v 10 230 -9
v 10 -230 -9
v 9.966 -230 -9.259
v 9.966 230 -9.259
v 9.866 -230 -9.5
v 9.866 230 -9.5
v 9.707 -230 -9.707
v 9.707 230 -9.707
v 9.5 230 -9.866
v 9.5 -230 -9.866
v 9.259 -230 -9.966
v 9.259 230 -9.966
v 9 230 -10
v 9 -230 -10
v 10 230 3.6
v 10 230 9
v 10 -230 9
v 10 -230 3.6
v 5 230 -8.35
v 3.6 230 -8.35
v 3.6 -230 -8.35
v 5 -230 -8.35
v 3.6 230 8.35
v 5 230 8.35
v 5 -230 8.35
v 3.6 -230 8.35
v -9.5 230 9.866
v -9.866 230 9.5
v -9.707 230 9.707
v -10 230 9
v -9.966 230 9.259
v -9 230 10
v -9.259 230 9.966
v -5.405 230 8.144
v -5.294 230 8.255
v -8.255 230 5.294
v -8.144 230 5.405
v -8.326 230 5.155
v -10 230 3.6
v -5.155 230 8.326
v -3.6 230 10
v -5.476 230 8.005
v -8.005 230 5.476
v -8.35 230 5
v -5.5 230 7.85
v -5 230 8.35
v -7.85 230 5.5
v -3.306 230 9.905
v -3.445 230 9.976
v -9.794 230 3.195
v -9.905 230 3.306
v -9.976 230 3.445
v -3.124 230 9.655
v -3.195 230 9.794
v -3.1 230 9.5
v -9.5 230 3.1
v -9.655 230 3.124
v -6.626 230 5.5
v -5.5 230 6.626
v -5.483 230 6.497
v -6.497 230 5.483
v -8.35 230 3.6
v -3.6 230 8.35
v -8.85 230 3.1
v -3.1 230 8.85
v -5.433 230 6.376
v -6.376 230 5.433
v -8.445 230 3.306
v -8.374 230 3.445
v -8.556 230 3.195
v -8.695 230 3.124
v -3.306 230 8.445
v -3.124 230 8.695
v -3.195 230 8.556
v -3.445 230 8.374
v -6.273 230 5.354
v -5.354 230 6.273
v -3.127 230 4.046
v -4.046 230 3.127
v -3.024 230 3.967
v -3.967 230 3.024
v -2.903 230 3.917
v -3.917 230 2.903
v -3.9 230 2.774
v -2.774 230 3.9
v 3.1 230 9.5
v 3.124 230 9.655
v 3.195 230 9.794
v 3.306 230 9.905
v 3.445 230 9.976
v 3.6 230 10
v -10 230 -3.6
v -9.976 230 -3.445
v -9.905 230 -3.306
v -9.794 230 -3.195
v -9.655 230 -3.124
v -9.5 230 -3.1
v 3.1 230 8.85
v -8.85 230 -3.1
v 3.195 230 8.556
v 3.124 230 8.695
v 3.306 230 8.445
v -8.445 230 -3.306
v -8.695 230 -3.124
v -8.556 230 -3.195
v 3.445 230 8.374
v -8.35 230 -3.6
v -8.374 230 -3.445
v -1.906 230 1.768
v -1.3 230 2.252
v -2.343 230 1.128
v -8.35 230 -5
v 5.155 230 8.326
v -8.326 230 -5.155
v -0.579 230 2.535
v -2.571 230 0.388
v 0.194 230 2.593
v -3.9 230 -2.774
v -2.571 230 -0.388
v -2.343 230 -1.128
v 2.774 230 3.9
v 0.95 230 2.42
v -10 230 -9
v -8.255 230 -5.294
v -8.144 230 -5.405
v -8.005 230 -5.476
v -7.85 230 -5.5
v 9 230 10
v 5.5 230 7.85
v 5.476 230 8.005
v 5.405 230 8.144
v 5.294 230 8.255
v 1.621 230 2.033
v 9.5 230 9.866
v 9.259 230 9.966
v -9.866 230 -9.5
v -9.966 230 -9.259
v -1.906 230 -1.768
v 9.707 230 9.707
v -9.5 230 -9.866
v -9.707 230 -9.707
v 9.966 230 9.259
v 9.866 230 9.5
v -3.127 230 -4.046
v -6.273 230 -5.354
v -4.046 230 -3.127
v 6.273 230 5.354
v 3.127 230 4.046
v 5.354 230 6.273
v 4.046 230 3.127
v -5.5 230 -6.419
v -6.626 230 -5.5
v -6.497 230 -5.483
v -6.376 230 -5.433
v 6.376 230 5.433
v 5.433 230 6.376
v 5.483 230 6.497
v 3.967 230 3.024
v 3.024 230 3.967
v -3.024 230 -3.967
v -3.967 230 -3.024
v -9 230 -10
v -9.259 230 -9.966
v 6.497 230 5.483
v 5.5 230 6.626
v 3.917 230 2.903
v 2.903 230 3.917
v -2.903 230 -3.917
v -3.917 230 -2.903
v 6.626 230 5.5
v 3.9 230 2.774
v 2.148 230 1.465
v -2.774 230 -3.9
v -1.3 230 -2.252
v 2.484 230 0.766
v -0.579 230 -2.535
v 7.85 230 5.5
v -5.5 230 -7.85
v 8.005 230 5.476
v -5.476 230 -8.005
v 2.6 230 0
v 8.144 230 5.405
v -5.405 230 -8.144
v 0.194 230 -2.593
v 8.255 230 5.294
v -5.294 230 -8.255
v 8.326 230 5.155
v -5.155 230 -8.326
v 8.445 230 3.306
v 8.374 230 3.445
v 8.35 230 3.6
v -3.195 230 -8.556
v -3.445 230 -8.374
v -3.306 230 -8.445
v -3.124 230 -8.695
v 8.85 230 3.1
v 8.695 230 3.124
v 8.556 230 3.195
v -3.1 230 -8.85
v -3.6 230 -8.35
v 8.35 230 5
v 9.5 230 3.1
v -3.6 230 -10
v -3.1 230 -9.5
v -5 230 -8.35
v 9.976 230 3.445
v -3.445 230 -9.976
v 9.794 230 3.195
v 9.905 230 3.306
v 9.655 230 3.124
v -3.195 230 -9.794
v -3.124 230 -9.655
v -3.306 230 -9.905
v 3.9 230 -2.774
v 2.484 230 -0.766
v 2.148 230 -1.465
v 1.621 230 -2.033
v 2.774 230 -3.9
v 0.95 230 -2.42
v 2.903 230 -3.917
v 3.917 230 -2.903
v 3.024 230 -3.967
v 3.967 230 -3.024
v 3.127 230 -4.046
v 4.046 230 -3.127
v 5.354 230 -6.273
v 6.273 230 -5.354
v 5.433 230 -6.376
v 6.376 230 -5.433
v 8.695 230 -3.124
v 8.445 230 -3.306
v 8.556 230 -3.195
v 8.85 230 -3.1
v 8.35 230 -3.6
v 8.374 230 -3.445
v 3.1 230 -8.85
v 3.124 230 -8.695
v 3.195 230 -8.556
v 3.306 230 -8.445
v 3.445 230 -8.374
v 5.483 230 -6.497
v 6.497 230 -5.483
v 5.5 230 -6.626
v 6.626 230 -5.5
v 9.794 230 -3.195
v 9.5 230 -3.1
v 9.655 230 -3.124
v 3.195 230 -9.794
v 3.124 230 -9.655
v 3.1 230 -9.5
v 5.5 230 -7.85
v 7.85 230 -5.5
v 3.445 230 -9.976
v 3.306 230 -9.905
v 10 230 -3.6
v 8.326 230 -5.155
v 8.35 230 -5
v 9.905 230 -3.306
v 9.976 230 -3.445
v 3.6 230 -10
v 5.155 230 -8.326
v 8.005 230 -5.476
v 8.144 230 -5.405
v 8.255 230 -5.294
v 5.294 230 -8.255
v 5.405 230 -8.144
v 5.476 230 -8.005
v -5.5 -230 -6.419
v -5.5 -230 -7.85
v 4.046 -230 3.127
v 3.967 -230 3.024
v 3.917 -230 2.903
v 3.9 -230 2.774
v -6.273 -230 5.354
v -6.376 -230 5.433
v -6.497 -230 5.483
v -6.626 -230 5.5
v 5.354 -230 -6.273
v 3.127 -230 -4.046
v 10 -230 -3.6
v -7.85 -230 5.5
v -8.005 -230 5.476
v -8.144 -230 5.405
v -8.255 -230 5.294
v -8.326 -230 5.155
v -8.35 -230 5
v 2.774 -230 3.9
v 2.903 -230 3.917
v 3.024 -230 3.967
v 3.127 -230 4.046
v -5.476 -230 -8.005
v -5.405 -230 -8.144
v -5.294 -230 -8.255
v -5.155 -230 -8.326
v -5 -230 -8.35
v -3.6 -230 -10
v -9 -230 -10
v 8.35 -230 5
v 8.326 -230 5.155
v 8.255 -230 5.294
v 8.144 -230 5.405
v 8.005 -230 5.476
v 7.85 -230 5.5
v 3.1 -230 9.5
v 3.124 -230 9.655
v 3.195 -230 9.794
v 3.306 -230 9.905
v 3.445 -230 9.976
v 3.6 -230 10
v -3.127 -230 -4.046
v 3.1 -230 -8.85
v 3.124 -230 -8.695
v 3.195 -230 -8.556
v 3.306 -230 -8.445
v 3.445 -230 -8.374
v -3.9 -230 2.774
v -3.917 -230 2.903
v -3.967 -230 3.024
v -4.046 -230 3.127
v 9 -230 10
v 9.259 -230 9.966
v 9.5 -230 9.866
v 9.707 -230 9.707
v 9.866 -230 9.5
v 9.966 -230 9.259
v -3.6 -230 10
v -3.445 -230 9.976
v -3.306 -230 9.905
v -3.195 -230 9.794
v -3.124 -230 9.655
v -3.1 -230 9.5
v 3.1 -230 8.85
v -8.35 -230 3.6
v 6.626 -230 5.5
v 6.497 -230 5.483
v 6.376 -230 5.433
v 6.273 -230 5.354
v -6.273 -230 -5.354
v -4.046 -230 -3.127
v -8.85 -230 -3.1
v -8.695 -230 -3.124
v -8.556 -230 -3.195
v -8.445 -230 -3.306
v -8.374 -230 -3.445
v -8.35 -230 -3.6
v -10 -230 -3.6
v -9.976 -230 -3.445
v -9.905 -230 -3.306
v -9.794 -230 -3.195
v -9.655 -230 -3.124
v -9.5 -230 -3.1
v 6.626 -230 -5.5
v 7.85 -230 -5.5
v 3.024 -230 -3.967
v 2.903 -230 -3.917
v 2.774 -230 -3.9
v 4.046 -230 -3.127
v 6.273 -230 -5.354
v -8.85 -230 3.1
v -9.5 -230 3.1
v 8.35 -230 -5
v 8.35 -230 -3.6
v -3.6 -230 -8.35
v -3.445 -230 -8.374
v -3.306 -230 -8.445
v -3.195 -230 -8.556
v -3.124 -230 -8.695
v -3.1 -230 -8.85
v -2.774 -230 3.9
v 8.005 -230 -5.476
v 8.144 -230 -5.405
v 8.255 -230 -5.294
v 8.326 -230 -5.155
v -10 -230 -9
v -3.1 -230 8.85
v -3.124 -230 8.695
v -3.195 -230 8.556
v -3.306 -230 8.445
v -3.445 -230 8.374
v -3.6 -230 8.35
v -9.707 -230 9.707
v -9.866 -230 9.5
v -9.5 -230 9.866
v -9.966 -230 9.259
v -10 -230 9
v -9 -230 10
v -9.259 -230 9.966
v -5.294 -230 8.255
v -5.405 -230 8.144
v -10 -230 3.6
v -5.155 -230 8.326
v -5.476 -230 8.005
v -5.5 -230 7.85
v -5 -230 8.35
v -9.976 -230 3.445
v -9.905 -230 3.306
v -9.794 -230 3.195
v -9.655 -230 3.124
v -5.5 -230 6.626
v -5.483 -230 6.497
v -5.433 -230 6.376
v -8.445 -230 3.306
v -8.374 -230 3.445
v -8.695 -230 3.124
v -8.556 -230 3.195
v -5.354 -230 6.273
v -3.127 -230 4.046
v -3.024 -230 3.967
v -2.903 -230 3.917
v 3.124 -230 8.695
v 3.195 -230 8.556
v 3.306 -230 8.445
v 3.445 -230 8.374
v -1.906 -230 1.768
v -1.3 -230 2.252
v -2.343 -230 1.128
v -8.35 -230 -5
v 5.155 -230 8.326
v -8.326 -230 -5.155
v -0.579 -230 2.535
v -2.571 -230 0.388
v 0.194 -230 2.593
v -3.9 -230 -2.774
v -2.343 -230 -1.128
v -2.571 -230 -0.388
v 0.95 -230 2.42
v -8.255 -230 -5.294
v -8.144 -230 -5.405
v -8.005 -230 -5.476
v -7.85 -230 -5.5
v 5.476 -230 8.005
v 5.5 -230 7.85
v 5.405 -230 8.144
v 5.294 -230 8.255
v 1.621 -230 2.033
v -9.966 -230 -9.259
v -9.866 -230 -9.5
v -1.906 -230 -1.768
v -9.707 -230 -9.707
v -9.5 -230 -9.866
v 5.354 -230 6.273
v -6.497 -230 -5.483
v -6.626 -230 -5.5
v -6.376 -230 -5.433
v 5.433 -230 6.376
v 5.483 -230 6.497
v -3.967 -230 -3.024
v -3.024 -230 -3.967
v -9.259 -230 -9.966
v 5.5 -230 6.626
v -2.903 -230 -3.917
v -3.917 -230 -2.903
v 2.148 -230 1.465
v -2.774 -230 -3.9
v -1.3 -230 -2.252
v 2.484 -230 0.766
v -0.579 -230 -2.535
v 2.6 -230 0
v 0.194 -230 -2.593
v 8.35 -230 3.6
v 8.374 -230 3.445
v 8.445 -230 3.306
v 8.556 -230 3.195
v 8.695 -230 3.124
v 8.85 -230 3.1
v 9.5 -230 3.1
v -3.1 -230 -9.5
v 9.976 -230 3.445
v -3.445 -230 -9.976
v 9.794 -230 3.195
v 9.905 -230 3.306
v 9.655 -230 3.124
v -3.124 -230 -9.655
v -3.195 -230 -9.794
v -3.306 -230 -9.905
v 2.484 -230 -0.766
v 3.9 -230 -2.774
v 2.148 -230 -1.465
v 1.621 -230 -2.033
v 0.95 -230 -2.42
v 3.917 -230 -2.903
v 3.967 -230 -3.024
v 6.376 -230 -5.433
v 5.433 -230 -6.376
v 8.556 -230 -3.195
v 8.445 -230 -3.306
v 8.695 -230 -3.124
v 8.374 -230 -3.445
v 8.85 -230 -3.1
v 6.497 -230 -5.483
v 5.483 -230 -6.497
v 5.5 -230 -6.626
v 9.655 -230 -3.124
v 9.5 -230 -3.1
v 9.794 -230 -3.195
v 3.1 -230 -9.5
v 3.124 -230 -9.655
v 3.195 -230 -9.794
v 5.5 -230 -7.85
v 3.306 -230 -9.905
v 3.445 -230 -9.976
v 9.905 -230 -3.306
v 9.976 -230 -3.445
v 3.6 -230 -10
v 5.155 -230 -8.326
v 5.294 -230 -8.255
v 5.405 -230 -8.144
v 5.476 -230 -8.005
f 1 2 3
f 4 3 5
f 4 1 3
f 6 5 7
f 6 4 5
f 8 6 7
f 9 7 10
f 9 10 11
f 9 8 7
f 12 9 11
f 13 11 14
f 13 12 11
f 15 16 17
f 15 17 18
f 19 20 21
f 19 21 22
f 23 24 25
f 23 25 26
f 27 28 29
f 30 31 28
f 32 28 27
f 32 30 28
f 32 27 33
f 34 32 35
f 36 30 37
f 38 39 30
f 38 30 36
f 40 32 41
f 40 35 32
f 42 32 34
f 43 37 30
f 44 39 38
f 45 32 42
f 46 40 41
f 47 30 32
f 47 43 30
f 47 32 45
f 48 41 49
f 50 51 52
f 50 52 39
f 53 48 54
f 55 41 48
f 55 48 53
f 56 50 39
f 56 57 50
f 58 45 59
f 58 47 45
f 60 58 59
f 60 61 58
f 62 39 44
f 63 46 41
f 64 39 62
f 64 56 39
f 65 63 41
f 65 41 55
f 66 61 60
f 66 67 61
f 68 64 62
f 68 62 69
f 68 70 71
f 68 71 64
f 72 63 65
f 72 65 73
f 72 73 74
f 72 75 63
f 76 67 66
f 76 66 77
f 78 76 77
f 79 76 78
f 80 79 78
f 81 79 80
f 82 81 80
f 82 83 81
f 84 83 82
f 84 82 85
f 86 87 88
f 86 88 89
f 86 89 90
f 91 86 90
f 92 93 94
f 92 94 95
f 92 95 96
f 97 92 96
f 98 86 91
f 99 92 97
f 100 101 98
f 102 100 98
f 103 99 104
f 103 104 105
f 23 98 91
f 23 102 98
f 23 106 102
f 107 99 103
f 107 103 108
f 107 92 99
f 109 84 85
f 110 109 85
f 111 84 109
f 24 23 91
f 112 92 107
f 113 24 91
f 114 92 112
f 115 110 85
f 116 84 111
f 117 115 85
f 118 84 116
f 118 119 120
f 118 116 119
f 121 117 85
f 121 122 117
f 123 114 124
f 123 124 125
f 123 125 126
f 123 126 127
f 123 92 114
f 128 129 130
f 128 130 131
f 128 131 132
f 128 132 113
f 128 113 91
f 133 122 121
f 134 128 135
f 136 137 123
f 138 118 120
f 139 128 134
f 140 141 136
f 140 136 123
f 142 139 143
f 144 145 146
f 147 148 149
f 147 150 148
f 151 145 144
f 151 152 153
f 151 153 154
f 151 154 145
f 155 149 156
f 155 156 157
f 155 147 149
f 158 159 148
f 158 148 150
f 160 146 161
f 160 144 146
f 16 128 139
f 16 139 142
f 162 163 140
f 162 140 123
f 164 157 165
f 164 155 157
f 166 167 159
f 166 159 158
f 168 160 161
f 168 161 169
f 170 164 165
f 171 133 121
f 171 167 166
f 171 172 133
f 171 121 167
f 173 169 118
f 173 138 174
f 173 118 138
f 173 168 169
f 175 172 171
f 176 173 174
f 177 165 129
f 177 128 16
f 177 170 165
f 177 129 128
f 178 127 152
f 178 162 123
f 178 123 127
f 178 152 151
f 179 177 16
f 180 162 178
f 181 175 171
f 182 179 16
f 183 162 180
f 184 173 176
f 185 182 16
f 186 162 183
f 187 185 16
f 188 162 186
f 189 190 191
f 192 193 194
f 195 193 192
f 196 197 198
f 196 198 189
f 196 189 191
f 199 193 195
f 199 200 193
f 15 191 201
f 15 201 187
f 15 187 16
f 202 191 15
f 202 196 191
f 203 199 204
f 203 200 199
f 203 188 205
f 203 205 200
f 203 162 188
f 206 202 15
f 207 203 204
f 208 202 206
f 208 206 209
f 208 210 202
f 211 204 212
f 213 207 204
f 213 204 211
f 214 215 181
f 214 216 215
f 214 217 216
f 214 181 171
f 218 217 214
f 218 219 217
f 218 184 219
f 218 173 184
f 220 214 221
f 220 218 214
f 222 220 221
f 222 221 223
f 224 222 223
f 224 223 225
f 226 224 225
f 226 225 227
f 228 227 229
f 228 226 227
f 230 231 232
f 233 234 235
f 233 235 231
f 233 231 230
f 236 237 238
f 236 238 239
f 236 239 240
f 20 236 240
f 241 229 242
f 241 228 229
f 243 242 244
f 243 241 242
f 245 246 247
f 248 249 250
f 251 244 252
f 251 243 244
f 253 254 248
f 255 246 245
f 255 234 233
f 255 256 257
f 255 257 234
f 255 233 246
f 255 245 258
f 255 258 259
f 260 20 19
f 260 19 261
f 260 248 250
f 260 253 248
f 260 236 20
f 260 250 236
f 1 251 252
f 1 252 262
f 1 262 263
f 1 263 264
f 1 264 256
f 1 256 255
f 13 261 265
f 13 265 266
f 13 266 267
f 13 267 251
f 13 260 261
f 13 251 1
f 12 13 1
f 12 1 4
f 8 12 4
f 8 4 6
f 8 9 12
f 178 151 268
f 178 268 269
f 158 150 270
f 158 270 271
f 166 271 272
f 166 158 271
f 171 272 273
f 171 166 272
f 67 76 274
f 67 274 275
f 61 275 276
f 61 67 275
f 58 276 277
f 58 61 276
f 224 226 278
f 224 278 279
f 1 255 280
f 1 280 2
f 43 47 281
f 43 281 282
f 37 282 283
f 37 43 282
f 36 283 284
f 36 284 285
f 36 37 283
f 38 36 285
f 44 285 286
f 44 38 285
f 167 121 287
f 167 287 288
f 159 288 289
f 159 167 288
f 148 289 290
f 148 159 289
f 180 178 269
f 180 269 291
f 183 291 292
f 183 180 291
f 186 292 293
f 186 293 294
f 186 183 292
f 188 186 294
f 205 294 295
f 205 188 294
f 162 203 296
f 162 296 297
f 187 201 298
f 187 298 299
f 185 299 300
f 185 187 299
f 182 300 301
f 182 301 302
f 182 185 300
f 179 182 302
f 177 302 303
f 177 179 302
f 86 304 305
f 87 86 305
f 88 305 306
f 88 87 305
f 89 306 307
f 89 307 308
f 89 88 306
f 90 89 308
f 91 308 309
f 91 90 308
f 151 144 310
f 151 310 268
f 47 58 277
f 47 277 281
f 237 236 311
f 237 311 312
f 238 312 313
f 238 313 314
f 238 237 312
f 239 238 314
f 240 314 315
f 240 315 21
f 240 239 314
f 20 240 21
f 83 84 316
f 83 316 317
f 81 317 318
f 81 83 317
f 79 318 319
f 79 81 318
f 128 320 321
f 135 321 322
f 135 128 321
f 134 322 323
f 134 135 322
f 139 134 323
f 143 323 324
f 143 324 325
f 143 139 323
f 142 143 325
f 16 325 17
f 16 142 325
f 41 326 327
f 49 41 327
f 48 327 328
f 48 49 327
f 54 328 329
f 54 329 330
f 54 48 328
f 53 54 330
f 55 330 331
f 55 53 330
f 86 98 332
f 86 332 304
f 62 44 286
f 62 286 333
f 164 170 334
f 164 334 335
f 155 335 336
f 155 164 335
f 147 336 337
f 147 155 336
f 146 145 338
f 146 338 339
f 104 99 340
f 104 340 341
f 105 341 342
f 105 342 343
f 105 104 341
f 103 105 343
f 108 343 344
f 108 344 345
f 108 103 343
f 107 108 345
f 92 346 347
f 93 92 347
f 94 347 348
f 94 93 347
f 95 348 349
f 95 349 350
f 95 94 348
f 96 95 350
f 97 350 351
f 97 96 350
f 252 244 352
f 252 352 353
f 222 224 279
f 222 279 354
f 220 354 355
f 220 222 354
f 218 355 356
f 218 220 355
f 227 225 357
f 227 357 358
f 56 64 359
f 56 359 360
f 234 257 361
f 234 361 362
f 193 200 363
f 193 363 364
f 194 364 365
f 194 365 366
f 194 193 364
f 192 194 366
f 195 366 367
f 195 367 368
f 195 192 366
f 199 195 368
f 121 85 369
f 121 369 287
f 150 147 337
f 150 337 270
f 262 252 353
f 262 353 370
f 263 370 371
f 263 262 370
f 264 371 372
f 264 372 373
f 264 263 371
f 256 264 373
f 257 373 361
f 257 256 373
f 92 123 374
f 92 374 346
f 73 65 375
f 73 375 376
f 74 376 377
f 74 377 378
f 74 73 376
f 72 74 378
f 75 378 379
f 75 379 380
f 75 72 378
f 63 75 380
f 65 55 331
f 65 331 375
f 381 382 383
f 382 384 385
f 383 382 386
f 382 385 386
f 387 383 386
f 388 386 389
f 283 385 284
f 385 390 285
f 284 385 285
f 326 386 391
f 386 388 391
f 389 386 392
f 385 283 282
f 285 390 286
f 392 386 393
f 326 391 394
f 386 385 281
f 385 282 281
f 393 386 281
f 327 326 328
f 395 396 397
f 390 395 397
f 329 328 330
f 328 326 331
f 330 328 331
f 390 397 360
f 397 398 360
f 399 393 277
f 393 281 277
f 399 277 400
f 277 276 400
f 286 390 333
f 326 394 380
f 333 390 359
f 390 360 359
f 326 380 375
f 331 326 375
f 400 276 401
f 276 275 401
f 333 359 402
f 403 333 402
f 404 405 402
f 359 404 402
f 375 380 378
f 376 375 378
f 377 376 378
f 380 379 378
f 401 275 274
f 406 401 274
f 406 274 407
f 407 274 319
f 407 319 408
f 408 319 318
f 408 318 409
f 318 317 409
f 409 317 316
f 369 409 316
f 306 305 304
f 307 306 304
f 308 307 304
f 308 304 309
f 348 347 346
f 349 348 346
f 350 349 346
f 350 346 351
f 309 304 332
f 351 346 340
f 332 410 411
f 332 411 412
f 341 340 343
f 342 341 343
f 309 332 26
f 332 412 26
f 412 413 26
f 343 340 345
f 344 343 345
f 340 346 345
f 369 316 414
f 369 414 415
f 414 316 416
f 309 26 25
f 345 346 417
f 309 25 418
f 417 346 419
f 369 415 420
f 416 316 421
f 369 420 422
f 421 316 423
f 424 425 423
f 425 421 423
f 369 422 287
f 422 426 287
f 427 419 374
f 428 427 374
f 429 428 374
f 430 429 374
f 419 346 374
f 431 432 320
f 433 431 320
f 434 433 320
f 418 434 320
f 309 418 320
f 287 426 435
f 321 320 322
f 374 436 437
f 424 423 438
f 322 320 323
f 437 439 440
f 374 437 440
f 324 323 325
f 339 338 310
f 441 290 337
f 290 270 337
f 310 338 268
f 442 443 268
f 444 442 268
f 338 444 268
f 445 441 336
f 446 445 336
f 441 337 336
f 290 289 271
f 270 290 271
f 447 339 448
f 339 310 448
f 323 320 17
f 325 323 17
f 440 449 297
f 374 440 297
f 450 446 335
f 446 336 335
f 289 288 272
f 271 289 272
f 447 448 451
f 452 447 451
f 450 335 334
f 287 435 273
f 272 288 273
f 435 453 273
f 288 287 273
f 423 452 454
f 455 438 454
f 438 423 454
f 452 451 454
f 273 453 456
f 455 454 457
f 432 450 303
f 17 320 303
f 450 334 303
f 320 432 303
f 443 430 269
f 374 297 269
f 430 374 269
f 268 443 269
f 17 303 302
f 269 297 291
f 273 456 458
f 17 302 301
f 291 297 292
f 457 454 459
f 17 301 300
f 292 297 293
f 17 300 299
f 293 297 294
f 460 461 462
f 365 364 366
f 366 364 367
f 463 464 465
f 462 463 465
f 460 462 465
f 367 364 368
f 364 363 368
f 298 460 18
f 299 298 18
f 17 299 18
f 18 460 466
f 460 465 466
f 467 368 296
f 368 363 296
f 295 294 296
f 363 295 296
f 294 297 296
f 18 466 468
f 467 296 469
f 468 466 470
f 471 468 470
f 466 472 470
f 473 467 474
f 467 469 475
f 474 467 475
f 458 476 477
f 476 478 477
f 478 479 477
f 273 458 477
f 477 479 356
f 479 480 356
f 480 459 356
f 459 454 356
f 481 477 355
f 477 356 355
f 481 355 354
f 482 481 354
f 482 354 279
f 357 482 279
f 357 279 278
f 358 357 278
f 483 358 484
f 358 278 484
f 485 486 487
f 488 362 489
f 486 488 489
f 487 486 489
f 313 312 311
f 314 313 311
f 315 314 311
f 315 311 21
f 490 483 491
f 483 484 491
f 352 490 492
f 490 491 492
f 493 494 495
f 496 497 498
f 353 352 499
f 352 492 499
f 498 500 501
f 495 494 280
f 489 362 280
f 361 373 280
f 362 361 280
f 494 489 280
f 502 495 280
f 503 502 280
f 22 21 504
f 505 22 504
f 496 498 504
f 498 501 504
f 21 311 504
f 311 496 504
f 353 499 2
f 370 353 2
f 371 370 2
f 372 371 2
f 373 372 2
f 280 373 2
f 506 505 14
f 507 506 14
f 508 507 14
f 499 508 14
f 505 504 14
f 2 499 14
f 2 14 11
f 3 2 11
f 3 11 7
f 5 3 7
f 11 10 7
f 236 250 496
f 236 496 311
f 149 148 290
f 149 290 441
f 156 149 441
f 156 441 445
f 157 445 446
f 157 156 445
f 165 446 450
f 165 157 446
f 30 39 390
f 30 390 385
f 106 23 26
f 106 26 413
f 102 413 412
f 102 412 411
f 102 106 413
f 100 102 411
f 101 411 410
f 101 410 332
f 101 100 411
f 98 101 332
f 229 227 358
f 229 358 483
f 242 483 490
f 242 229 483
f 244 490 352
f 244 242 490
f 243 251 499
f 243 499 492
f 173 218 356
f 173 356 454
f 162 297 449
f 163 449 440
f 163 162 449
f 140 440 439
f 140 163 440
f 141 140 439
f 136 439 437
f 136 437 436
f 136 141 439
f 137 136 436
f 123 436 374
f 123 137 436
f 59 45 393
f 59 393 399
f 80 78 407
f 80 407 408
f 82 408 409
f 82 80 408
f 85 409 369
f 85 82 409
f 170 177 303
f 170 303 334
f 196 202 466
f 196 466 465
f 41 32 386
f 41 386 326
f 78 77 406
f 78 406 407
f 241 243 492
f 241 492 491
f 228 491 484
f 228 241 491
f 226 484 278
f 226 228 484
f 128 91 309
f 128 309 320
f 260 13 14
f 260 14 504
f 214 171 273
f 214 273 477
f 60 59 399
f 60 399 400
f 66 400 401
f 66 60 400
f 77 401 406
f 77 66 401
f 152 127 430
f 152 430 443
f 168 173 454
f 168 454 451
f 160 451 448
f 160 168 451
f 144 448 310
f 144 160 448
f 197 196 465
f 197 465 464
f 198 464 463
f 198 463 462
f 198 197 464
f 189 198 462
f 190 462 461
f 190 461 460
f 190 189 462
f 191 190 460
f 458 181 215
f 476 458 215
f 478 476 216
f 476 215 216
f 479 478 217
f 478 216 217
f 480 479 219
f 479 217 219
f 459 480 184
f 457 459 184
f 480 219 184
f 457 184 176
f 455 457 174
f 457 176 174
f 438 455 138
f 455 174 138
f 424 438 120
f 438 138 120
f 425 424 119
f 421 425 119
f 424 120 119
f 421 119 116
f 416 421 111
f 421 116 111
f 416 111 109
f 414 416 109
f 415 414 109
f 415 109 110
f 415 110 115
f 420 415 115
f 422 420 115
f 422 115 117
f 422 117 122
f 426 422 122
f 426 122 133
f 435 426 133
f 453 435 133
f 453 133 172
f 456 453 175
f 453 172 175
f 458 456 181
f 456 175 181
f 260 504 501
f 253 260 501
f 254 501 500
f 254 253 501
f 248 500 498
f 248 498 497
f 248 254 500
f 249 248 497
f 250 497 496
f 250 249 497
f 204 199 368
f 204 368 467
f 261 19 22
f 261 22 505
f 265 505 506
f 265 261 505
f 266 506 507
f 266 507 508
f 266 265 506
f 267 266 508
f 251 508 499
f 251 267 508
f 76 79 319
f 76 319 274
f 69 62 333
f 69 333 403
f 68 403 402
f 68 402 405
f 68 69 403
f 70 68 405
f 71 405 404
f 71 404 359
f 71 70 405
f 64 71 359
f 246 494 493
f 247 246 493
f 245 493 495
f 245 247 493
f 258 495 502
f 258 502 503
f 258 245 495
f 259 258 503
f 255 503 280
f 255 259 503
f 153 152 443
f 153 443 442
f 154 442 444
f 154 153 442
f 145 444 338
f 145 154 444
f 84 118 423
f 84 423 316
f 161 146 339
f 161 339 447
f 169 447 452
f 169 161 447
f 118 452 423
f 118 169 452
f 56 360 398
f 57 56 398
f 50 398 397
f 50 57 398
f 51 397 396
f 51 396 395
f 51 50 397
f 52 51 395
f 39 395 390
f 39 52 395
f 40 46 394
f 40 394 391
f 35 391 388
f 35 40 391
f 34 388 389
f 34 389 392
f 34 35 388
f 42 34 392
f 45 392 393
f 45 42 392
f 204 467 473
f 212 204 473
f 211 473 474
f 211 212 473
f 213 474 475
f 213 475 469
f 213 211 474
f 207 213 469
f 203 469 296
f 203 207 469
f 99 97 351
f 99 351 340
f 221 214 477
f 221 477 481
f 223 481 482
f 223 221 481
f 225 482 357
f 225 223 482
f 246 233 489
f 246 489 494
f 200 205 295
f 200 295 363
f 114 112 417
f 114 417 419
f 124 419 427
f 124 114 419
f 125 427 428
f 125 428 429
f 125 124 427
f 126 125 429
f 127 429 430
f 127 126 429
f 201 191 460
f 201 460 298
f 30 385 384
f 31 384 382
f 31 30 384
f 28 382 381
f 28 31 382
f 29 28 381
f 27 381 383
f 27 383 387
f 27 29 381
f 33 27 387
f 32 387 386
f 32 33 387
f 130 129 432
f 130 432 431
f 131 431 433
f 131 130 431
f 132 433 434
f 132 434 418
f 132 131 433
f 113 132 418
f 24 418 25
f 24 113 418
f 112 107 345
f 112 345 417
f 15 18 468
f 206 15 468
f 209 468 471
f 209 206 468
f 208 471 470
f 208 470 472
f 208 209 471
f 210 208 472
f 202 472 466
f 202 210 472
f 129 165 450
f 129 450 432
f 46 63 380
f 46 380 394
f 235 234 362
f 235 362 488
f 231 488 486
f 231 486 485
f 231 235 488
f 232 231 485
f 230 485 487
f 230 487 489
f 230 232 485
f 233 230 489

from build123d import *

# Parameters (mm, degrees)
SKETCH1_R           = 2.6
BOSS_EXTRUDE1_DEPTH = 460


with BuildPart() as part:
    # Sketch1 → Boss-Extrude1 (new body)
    with BuildSketch(Plane(origin=(0, 230, 0), x_dir=(1, 0, 0), z_dir=(0, 1, 0))):
        with BuildLine():
            Line((-3.1, 8.85), (-3.1, 9.5))
            ThreePointArc((-3.1, 9.5), (-3.246446609, 9.853553391), (-3.6, 10))
            Line((-3.6, 10), (-9, 10))
            ThreePointArc((-9, 10), (-9.707106781, 9.707106781), (-10, 9))
            Line((-10, 9), (-10, 3.6))
            ThreePointArc((-10, 3.6), (-9.853553391, 3.246446609), (-9.5, 3.1))
            Line((-9.5, 3.1), (-8.85, 3.1))
            ThreePointArc((-8.85, 3.1), (-8.496446609, 3.246446609), (-8.35, 3.6))
            Line((-8.35, 3.6), (-8.35, 5))
            ThreePointArc((-8.35, 5), (-8.203553391, 5.353553391), (-7.85, 5.5))
            Line((-7.85, 5.5), (-6.626345597, 5.5))
            ThreePointArc((-6.626345597, 5.5), (-6.435003881, 5.461939766), (-6.272792206, 5.353553391))
            Line((-6.272792206, 5.353553391), (-4.046446609, 3.127207794))
            ThreePointArc((-4.046446609, 3.127207794), (-3.938060234, 2.964996119), (-3.9, 2.773654403))
            Line((-3.9, 2.773654403), (-3.9, -2.773654403))
            ThreePointArc((-3.9, -2.773654403), (-3.938060234, -2.964996119), (-4.046446609, -3.127207794))
            Line((-4.046446609, -3.127207794), (-6.272792206, -5.353553391))
            ThreePointArc((-6.272792206, -5.353553391), (-6.435003881, -5.461939766), (-6.626345597, -5.5))
            Line((-6.626345597, -5.5), (-7.85, -5.5))
            ThreePointArc((-7.85, -5.5), (-8.203553391, -5.353553391), (-8.35, -5))
            Line((-8.35, -5), (-8.35, -3.6))
            ThreePointArc((-8.35, -3.6), (-8.496446609, -3.246446609), (-8.85, -3.1))
            Line((-8.85, -3.1), (-9.5, -3.1))
            ThreePointArc((-9.5, -3.1), (-9.853553391, -3.246446609), (-10, -3.6))
            Line((-10, -3.6), (-10, -9))
            ThreePointArc((-10, -9), (-9.707106781, -9.707106781), (-9, -10))
            Line((-9, -10), (-3.6, -10))
            ThreePointArc((-3.6, -10), (-3.246446609, -9.853553391), (-3.1, -9.5))
            Line((-3.1, -9.5), (-3.1, -8.85))
            ThreePointArc((-3.1, -8.85), (-3.246446609, -8.496446609), (-3.6, -8.35))
            Line((-3.6, -8.35), (-5, -8.35))
            ThreePointArc((-5, -8.35), (-5.353553391, -8.203553391), (-5.5, -7.85))
            Line((-5.5, -7.85), (-5.5, -6.626345597))
            ThreePointArc((-5.5, -6.626345597), (-5.461939766, -6.435003881), (-5.353553391, -6.272792206))
            Line((-5.353553391, -6.272792206), (-3.127207794, -4.046446609))
            ThreePointArc((-3.127207794, -4.046446609), (-2.964996119, -3.938060234), (-2.773654403, -3.9))
            Line((-2.773654403, -3.9), (2.773654403, -3.9))
            ThreePointArc((2.773654403, -3.9), (2.964996119, -3.938060234), (3.127207794, -4.046446609))
            Line((3.127207794, -4.046446609), (5.353553391, -6.272792206))
            ThreePointArc((5.353553391, -6.272792206), (5.461939766, -6.435003881), (5.5, -6.626345597))
            Line((5.5, -6.626345597), (5.5, -7.85))
            ThreePointArc((5.5, -7.85), (5.353553391, -8.203553391), (5, -8.35))
            Line((5, -8.35), (3.6, -8.35))
            ThreePointArc((3.6, -8.35), (3.246446609, -8.496446609), (3.1, -8.85))
            Line((3.1, -8.85), (3.1, -9.5))
            ThreePointArc((3.1, -9.5), (3.246446609, -9.853553391), (3.6, -10))
            Line((3.6, -10), (9, -10))
            ThreePointArc((9, -10), (9.707106781, -9.707106781), (10, -9))
            Line((10, -9), (10, -3.6))
            ThreePointArc((10, -3.6), (9.853553391, -3.246446609), (9.5, -3.1))
            Line((9.5, -3.1), (8.85, -3.1))
            ThreePointArc((8.85, -3.1), (8.496446609, -3.246446609), (8.35, -3.6))
            Line((8.35, -3.6), (8.35, -5))
            ThreePointArc((8.35, -5), (8.203553391, -5.353553391), (7.85, -5.5))
            Line((7.85, -5.5), (6.626345597, -5.5))
            ThreePointArc((6.626345597, -5.5), (6.435003881, -5.461939766), (6.272792206, -5.353553391))
            Line((6.272792206, -5.353553391), (4.046446609, -3.127207794))
            ThreePointArc((4.046446609, -3.127207794), (3.938060234, -2.964996119), (3.9, -2.773654403))
            Line((3.9, -2.773654403), (3.9, 2.773654403))
            ThreePointArc((3.9, 2.773654403), (3.938060234, 2.964996119), (4.046446609, 3.127207794))
            Line((4.046446609, 3.127207794), (6.272792206, 5.353553391))
            ThreePointArc((6.272792206, 5.353553391), (6.435003881, 5.461939766), (6.626345597, 5.5))
            Line((6.626345597, 5.5), (7.85, 5.5))
            ThreePointArc((7.85, 5.5), (8.203553391, 5.353553391), (8.35, 5))
            Line((8.35, 5), (8.35, 3.6))
            ThreePointArc((8.35, 3.6), (8.496446609, 3.246446609), (8.85, 3.1))
            Line((8.85, 3.1), (9.5, 3.1))
            ThreePointArc((9.5, 3.1), (9.853553391, 3.246446609), (10, 3.6))
            Line((10, 3.6), (10, 9))
            ThreePointArc((10, 9), (9.707106781, 9.707106781), (9, 10))
            Line((9, 10), (3.6, 10))
            ThreePointArc((3.6, 10), (3.246446609, 9.853553391), (3.1, 9.5))
            Line((3.1, 9.5), (3.1, 8.85))
            ThreePointArc((3.1, 8.85), (3.246446609, 8.496446609), (3.6, 8.35))
            Line((3.6, 8.35), (5, 8.35))
            ThreePointArc((5, 8.35), (5.353553391, 8.203553391), (5.5, 7.85))
            Line((5.5, 7.85), (5.5, 6.626345597))
            ThreePointArc((5.5, 6.626345597), (5.461939766, 6.435003881), (5.353553391, 6.272792206))
            Line((5.353553391, 6.272792206), (3.127207794, 4.046446609))
            ThreePointArc((3.127207794, 4.046446609), (2.964996119, 3.938060234), (2.773654403, 3.9))
            Line((2.773654403, 3.9), (-2.773654403, 3.9))
            ThreePointArc((-2.773654403, 3.9), (-2.964996119, 3.938060234), (-3.127207794, 4.046446609))
            Line((-3.127207794, 4.046446609), (-5.5, 6.419238816))
            Line((-5.5, 6.419238816), (-5.5, 7.85))
            ThreePointArc((-5.5, 7.85), (-5.353553391, 8.203553391), (-5, 8.35))
            Line((-5, 8.35), (-3.6, 8.35))
            ThreePointArc((-3.6, 8.35), (-3.246446609, 8.496446609), (-3.1, 8.85))
        make_face()
        Circle(SKETCH1_R, mode=Mode.SUBTRACT)
    extrude(amount=-BOSS_EXTRUDE1_DEPTH)


solid = part.part
